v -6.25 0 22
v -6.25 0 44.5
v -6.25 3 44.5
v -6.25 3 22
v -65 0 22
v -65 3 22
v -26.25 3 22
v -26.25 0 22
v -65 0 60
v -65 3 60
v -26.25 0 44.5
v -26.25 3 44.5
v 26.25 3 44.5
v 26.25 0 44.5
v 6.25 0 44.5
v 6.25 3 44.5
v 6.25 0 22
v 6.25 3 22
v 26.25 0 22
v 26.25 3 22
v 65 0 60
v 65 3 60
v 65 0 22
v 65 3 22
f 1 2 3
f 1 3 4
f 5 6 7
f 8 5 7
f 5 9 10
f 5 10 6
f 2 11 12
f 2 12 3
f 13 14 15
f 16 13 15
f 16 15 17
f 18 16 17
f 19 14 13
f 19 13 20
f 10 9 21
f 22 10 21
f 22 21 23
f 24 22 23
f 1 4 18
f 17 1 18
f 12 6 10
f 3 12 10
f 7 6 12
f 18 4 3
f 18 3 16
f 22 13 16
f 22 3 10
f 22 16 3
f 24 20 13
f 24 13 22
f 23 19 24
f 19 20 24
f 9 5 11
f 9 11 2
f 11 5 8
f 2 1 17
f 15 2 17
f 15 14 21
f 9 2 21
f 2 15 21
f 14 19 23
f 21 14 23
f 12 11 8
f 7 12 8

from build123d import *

# Parameters (mm, degrees)
SKETCH1_W               = 130
SKETCH1_H               = 120
BOSS_EXTRUDE1_DEPTH     = 3
CUT_EXTRUDE1_START      = -4
SKETCH2_W               = 20
SKETCH2_H               = 89
CUT_EXTRUDE1_DEPTH      = 5
CUT_EXTRUDE2_START      = -4
SKETCH3_R               = 1.6
CUT_EXTRUDE2_DEPTH      = 5
SKETCH4_W               = 130
SKETCH4_H               = 82
CUT_EXTRUDE3_DEPTH      = 1
CUT_EXTRUDE3_DEPTH_BACK = 4


with BuildPart() as part:
    # Sketch1 → Boss-Extrude1 (new body)
    with BuildSketch(Plane(origin=(0, 0, 0), x_dir=(1, 0, 0), z_dir=(0, 1, 0))):
        Rectangle(SKETCH1_W, SKETCH1_H)
    extrude(amount=BOSS_EXTRUDE1_DEPTH)

    # Sketch2 → Cut-Extrude1 (cut)
    with BuildSketch(Plane(origin=(0, 3, 0), x_dir=(1, 0, 0), z_dir=(0, 1, 0)).offset(CUT_EXTRUDE1_START)):
        with Locations((-16.25, 0)):
            Rectangle(SKETCH2_W, SKETCH2_H)
    cut_extrude1 = extrude(amount=CUT_EXTRUDE1_DEPTH, mode=Mode.SUBTRACT)

    # Mirror1: Cut-Extrude1 across plane
    add(cut_extrude1.mirror(Plane(origin=(0, 0, 0), x_dir=(0, 0, 1), z_dir=(1, 0, 0))), mode=Mode.SUBTRACT)

    # Sketch3 → Cut-Extrude2 (cut)
    with BuildSketch(Plane(origin=(0, 3, 0), x_dir=(1, 0, 0), z_dir=(0, 1, 0)).offset(CUT_EXTRUDE2_START)):
        with Locations((44.5, 0)):
            Circle(SKETCH3_R)
    cut_extrude2 = extrude(amount=CUT_EXTRUDE2_DEPTH, mode=Mode.SUBTRACT)

    # Mirror2: Cut-Extrude2 across plane
    add(cut_extrude2.mirror(Plane(origin=(0, 0, 0), x_dir=(0, 0, 1), z_dir=(1, 0, 0))), mode=Mode.SUBTRACT)

    # Sketch4 → Cut-Extrude3 (cut, two sides)
    with BuildSketch(Plane(origin=(0, 3, 0), x_dir=(1, 0, 0), z_dir=(0, 1, 0))) as cut_extrude3_sk:
        with Locations((0, 19)):
            Rectangle(SKETCH4_W, SKETCH4_H)
    extrude(amount=CUT_EXTRUDE3_DEPTH, mode=Mode.SUBTRACT)
    extrude(cut_extrude3_sk.sketch, amount=-CUT_EXTRUDE3_DEPTH_BACK, mode=Mode.SUBTRACT)


solid = part.part
